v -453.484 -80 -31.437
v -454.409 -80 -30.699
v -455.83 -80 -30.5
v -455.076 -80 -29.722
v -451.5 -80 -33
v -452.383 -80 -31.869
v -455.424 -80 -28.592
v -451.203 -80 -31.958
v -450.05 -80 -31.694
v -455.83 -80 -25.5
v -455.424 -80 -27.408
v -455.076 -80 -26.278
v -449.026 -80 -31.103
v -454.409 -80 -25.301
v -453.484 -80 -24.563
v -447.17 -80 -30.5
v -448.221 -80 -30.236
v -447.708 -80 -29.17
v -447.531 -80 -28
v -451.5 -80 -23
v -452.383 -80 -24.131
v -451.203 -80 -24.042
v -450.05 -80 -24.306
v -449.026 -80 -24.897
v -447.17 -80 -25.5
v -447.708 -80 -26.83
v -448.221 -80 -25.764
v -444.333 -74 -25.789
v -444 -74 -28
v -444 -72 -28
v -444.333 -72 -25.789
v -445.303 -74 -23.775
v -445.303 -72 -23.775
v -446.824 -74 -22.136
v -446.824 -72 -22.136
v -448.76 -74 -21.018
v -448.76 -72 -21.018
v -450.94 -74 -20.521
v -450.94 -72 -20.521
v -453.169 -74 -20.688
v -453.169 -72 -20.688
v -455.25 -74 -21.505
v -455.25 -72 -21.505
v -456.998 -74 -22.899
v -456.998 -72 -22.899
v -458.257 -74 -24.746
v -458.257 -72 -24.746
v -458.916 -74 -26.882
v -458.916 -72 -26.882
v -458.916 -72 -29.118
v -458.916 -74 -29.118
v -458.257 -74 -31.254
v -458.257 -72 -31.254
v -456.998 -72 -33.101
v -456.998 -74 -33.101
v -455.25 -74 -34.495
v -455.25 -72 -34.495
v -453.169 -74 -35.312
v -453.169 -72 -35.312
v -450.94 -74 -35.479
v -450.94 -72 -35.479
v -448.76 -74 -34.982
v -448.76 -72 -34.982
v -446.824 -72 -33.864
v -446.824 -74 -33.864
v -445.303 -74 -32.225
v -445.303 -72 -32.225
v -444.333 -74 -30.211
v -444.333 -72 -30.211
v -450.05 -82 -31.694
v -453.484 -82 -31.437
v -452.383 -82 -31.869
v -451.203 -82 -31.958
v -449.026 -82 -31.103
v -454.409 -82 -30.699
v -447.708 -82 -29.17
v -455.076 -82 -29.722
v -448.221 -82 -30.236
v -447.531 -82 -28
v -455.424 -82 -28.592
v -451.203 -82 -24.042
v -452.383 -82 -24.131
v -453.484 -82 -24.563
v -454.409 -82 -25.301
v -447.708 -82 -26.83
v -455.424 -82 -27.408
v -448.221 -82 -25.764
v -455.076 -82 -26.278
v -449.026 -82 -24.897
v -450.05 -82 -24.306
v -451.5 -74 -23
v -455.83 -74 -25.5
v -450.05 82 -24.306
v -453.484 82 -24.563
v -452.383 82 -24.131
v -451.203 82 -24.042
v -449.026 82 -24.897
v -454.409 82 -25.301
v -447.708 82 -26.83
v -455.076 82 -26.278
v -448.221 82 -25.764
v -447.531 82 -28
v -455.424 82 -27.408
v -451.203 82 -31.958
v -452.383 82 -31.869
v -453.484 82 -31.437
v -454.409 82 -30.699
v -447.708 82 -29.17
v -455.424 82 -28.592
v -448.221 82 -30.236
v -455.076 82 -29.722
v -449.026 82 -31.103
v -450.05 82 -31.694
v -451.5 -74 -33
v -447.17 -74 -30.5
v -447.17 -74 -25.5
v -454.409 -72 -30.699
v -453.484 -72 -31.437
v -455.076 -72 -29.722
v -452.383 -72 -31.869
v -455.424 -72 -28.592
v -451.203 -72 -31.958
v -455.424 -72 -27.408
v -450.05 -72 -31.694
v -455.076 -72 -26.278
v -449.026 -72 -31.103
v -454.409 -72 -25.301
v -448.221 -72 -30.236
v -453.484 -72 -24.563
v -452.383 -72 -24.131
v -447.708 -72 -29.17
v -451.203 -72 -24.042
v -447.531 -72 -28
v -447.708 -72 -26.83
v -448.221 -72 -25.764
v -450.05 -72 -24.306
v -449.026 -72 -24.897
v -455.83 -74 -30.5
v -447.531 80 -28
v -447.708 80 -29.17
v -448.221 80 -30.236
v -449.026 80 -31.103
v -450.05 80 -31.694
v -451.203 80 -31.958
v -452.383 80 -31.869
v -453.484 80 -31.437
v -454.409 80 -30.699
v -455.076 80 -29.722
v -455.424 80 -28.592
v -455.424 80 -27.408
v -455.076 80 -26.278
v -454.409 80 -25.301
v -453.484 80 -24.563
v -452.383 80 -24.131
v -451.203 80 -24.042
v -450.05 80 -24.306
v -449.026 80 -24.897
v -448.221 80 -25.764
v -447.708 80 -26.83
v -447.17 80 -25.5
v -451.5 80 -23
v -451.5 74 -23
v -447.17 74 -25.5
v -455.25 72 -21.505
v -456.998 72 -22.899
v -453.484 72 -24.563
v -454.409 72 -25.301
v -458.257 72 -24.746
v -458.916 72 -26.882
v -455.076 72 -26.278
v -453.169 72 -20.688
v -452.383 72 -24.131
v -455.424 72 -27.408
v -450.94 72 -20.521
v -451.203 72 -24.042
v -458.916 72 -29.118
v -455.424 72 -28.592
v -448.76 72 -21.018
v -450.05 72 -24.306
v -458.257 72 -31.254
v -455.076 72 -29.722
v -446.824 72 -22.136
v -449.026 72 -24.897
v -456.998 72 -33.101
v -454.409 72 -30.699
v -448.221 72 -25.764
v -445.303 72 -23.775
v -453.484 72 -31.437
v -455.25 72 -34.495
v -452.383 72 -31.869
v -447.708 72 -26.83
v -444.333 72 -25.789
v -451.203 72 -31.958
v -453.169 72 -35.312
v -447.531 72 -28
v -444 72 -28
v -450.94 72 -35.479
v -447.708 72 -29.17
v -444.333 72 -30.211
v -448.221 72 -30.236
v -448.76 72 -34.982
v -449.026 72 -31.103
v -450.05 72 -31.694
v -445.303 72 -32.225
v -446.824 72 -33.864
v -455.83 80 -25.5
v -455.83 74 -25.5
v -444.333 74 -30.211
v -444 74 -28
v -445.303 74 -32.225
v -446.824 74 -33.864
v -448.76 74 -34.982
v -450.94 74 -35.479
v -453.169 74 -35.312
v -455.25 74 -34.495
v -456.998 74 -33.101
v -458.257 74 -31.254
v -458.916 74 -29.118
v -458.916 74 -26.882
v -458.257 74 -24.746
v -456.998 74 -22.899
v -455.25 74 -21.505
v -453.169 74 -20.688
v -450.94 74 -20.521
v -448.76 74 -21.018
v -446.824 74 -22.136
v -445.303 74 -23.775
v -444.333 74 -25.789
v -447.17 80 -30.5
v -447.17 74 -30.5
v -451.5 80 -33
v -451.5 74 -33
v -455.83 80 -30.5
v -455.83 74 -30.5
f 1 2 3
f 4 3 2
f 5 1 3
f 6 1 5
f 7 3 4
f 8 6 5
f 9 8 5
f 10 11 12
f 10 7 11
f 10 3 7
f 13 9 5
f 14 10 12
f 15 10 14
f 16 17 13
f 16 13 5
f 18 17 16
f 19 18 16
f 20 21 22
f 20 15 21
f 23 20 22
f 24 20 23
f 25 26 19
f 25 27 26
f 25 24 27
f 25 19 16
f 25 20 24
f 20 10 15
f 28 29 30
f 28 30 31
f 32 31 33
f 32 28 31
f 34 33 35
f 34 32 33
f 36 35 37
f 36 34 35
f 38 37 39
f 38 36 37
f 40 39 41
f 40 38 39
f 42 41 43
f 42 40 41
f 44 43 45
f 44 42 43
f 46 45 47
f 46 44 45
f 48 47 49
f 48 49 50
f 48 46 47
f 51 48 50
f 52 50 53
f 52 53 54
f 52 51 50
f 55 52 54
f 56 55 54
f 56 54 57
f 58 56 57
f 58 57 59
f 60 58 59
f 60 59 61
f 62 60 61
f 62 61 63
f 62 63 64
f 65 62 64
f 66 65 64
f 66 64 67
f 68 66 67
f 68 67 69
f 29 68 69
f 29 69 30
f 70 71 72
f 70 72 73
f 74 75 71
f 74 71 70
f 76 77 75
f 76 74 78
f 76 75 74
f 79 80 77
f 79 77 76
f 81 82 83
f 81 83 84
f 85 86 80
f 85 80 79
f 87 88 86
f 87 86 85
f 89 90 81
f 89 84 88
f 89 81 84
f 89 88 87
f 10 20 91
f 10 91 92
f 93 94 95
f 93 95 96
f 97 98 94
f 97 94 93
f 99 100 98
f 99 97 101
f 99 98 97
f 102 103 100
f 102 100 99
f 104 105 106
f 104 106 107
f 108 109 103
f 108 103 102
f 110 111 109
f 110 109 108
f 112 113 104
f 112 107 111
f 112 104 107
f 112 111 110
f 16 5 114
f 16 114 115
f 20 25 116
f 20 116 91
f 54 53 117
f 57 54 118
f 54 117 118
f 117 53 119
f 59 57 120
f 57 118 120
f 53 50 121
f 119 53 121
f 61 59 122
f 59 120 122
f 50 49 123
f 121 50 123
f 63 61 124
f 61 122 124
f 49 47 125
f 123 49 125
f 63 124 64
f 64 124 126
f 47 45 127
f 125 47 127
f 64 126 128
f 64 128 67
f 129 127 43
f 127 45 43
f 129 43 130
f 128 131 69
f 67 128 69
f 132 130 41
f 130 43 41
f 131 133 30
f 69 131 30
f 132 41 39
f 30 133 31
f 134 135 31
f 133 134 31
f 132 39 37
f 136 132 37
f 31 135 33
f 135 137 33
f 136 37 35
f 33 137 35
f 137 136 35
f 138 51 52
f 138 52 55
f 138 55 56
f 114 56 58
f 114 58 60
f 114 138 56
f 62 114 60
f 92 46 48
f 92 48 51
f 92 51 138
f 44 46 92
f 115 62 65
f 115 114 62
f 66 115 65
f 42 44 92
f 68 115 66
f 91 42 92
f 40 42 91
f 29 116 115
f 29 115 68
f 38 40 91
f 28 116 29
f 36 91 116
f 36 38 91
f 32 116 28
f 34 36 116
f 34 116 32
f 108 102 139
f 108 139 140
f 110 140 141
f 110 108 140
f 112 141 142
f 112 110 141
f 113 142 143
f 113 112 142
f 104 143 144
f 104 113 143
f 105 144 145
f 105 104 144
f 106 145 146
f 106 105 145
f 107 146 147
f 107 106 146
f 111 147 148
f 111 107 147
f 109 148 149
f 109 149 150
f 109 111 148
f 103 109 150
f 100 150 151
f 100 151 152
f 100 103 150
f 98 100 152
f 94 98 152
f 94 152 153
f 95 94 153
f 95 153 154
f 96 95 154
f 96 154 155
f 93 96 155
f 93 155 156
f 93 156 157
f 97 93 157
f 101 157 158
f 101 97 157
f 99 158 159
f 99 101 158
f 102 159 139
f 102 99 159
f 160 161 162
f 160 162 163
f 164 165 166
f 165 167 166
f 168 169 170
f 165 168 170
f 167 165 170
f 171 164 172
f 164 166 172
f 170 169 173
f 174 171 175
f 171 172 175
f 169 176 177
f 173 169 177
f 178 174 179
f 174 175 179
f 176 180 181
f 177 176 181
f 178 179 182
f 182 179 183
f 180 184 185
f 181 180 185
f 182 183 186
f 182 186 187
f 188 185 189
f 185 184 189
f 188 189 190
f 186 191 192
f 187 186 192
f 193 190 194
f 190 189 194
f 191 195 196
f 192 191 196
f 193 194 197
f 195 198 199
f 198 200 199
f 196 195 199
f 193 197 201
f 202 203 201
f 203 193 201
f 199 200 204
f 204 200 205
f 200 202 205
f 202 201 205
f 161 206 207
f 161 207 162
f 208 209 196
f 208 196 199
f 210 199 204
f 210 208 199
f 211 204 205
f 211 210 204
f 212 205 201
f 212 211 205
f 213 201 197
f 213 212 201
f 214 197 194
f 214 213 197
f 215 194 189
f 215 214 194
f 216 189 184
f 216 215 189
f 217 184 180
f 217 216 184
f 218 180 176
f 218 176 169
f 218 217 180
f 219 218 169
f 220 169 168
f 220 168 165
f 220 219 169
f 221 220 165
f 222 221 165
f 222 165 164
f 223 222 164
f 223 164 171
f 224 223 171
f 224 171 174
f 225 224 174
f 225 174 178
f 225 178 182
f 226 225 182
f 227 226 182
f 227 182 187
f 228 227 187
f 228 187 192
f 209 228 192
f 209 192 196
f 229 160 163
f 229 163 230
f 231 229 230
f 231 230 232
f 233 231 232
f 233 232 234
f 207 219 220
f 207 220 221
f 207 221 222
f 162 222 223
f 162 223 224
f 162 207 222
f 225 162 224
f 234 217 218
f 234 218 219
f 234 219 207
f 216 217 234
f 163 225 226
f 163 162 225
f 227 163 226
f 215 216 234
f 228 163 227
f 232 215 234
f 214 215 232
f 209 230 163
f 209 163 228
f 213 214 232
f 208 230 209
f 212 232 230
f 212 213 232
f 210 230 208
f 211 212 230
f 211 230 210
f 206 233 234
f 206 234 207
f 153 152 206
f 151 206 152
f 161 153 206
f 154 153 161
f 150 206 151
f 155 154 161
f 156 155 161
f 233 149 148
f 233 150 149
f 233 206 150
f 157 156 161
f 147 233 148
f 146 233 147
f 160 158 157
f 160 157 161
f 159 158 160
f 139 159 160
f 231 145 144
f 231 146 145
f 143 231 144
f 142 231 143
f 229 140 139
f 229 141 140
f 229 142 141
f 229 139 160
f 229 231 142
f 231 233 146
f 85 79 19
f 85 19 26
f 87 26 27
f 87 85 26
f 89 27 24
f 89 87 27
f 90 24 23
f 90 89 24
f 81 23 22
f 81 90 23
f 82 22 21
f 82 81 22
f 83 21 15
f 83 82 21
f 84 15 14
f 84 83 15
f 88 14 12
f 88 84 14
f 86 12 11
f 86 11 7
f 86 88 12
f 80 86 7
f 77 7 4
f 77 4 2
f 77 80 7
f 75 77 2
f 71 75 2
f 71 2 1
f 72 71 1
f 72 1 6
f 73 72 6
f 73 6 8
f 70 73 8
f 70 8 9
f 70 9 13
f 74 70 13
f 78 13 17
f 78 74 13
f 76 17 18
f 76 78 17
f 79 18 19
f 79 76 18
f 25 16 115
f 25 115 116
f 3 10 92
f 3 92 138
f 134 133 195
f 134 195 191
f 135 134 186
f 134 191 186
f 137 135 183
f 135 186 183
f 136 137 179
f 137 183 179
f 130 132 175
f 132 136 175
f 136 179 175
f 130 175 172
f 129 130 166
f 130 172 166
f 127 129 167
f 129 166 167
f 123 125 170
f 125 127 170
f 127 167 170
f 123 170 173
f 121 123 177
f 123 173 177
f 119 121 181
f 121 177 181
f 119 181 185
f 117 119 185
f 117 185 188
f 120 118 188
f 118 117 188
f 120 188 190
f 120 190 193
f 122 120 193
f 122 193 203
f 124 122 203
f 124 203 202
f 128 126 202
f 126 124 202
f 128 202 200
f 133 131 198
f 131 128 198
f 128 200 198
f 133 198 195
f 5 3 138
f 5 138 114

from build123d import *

# Parameters (mm, degrees)
SKETCH013_R     = 3.96875
PAD009_DEPTH    = 164
SKETCH014_R     = 7.5
PAD010_DEPTH    = 10
SKETCH015_R     = 7.5
POCKET003_DEPTH = 8
SKETCH016_R     = 7.5
SKETCH016_R_2   = 3.96875
POCKET004_DEPTH = 2
SKETCH017_R     = 7.5
PAD011_DEPTH    = 10
SKETCH018_R     = 7.5
POCKET005_DEPTH = 8
SKETCH019_R     = 7.5
SKETCH019_R_2   = 3.96875
POCKET006_DEPTH = 2


with BuildPart() as part:
    # Sketch013 → Pad009 (new body)
    with BuildSketch(Plane(origin=(500, 82, 56), x_dir=(1, 0, 0), z_dir=(0, -1, 0))):
        Circle(SKETCH013_R)
    extrude(amount=PAD009_DEPTH)

    # Sketch014 → Pad010 (new body)
    with BuildSketch(Plane(origin=(500, 82, 56), x_dir=(1, 0, 0), z_dir=(0, 1, 0))):
        Circle(SKETCH014_R)
    extrude(amount=-PAD010_DEPTH)

    # Sketch015 → Pocket003 (cut)
    with BuildSketch(Plane(origin=(500, 82, 56), x_dir=(1, 0, 0), z_dir=(0, 1, 0))):
        Circle(SKETCH015_R)
        Polygon((0, 5), (-4.330127, 2.5), (-4.330127, -2.5), (0, -5), (4.330127, -2.5), (4.330127, 2.5), align=None, mode=Mode.SUBTRACT)
    extrude(amount=-POCKET003_DEPTH, mode=Mode.SUBTRACT)

    # Sketch016 → Pocket004 (cut)
    with BuildSketch(Plane(origin=(500, 82, 56), x_dir=(1, 0, 0), z_dir=(0, 1, 0))):
        Circle(SKETCH016_R)
        Circle(SKETCH016_R_2, mode=Mode.SUBTRACT)
    extrude(amount=-POCKET004_DEPTH, mode=Mode.SUBTRACT)

    # Sketch017 → Pad011 (new body)
    with BuildSketch(Plane(origin=(500, -82, 56), x_dir=(1, 0, 0), z_dir=(0, -1, 0))):
        Circle(SKETCH017_R)
    extrude(amount=-PAD011_DEPTH)

    # Sketch018 → Pocket005 (cut)
    with BuildSketch(Plane(origin=(500, -82, 56), x_dir=(1, 0, 0), z_dir=(0, -1, 0))):
        Circle(SKETCH018_R)
        Polygon((0, 5), (-4.330127, 2.5), (-4.330127, -2.5), (0, -5), (4.330127, -2.5), (4.330127, 2.5), align=None, mode=Mode.SUBTRACT)
    extrude(amount=-POCKET005_DEPTH, mode=Mode.SUBTRACT)

    # Sketch019 → Pocket006 (cut)
    with BuildSketch(Plane(origin=(500, -82, 56), x_dir=(1, 0, 0), z_dir=(0, -1, 0))):
        Circle(SKETCH019_R)
        Circle(SKETCH019_R_2, mode=Mode.SUBTRACT)
    extrude(amount=-POCKET006_DEPTH, mode=Mode.SUBTRACT)


with BuildPart() as part_1:
    # Clone020 placement: moved
    add(part.part.moved(Location((-951.5, 0, -84))))


solid = part_1.part
